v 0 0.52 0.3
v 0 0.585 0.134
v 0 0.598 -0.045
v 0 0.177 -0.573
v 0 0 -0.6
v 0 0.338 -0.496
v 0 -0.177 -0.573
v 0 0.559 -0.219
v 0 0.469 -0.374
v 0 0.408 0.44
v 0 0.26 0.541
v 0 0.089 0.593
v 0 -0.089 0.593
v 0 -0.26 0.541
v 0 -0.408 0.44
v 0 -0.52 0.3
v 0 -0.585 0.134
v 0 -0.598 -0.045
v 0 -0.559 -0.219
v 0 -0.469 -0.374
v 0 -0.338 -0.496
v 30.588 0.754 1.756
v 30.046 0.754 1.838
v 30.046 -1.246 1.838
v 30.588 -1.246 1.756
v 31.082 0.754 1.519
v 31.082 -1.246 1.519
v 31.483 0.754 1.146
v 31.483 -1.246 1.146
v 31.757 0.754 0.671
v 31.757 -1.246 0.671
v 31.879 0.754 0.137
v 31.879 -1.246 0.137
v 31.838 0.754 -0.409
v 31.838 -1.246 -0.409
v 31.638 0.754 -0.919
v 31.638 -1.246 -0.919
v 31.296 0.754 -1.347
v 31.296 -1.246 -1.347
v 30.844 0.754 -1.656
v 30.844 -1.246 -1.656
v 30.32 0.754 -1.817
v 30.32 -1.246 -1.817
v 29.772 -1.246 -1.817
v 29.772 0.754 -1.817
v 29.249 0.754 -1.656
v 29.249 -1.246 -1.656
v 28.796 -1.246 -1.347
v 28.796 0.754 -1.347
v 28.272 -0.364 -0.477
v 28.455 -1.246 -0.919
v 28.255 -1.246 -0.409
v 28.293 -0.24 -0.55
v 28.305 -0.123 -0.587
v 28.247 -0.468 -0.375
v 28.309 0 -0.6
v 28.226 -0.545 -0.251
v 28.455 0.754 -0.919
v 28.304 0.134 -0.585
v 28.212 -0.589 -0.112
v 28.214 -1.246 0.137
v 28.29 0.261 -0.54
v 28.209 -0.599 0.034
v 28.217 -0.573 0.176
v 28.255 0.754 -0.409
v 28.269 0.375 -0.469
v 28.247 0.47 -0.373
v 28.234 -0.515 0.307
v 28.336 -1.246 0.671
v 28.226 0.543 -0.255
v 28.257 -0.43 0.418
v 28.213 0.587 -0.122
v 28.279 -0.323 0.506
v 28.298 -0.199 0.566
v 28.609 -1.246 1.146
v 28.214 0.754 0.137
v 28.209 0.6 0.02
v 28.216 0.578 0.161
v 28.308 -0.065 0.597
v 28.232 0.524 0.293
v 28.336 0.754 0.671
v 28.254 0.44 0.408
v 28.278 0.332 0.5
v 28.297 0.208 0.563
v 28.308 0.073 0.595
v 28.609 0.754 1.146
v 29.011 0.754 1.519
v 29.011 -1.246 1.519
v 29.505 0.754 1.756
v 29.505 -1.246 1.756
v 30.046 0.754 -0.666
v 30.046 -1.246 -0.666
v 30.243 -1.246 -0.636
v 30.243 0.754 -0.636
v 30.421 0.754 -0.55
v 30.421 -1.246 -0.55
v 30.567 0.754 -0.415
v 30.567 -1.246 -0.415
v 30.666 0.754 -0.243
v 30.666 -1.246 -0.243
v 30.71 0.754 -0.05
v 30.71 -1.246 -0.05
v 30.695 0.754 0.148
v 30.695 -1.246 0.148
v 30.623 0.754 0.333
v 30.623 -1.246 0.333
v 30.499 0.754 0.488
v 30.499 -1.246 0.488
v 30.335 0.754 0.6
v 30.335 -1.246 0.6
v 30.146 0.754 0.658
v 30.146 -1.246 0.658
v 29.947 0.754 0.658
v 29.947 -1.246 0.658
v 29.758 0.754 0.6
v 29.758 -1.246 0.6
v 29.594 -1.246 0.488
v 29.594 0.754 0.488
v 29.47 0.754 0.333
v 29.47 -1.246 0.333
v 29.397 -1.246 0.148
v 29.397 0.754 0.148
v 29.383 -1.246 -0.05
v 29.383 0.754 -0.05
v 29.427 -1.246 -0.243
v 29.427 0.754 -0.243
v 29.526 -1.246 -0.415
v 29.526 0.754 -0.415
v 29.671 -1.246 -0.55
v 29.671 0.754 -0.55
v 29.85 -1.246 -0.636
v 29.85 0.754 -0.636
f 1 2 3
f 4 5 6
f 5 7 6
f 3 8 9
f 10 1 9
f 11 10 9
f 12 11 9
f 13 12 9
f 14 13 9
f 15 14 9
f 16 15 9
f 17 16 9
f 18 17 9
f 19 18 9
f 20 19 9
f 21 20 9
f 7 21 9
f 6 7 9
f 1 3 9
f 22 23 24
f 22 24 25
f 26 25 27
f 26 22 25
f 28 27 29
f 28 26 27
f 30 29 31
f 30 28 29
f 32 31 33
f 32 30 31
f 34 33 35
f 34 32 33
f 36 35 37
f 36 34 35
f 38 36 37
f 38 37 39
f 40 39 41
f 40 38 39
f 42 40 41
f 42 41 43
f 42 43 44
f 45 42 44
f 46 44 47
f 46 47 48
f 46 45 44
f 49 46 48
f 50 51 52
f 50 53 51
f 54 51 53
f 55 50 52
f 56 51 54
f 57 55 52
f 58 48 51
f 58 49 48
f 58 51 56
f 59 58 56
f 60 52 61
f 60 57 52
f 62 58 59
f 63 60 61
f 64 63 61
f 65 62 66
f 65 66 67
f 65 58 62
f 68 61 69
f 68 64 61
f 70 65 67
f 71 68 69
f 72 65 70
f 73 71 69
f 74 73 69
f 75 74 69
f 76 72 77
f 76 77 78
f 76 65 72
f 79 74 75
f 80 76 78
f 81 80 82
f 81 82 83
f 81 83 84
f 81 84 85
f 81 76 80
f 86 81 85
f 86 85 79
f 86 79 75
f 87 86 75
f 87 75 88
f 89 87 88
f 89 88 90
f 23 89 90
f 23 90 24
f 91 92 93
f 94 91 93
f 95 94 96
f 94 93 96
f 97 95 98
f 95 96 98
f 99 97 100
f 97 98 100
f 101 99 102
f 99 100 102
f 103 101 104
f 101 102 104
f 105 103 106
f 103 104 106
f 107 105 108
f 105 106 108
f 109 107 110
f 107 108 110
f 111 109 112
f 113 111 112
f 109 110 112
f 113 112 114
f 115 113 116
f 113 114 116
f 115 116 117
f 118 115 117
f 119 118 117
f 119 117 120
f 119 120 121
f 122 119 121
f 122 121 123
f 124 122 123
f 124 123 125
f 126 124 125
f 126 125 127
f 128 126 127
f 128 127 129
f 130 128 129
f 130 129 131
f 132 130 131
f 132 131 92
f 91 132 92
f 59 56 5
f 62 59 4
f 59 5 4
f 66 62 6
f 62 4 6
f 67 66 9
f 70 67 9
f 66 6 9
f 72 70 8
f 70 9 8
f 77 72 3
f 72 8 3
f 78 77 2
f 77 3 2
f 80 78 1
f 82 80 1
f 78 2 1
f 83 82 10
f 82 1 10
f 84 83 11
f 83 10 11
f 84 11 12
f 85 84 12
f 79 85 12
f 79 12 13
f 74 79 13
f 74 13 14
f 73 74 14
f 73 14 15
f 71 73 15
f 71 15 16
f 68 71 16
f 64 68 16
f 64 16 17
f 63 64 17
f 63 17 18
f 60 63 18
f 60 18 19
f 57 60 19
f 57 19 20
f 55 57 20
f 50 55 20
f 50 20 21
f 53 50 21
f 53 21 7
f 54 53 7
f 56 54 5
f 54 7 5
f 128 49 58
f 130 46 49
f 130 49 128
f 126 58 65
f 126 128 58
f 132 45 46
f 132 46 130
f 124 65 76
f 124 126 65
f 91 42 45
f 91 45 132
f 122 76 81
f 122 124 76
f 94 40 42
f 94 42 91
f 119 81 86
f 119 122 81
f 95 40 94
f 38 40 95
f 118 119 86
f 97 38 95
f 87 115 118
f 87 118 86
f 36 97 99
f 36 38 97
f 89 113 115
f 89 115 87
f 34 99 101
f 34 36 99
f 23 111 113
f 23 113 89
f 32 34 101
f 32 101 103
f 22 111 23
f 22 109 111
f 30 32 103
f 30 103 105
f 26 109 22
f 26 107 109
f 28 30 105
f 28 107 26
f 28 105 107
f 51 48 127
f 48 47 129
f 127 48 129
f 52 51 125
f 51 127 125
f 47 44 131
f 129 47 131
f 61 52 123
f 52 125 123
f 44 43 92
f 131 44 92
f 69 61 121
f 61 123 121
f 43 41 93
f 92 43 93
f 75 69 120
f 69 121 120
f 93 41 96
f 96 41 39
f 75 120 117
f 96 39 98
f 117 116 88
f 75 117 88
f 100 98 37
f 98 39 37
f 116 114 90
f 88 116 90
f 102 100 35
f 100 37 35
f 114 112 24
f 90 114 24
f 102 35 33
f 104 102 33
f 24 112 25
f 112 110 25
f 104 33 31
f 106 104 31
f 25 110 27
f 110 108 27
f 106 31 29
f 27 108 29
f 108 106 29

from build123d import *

# Parameters (mm, degrees)
SKETCH_1_R          = 0.6
EXTRUDE_1_DEPTH     = 30
SKETCH_2_R          = 1.837847415
EXTRUDE_2_DEPTH     = 1
SKETCH_3_R          = 0.665703361
CUT_EXTRUDE_1_DEPTH = 32.999712653


with BuildPart() as part:
    # 草图1 → 凸台-拉伸1 (new body)
    with BuildSketch(Plane(origin=(0, 0, 0), x_dir=(0, 0, -1), z_dir=(1, 0, 0))):
        Circle(SKETCH_1_R)
    extrude(amount=EXTRUDE_1_DEPTH)

    # 草图2 → 凸台-拉伸2 (add, symmetric)
    with BuildSketch(Plane(origin=(8.379426917, -0.245734266, -12), x_dir=(1, 0, 0), z_dir=(0, 1, 0))):
        with Locations(Location((21.666952485, -12, 0), (0, 0, 270))):
            Circle(SKETCH_2_R)
    extrude(amount=EXTRUDE_2_DEPTH, both=True)

    # 草图3 → 切除-拉伸1 (cut, through all)
    with BuildSketch(Plane(origin=(0, -1.245734266, 0), x_dir=(-1, 0, 0), z_dir=(0, -1, 0))):
        with Locations(Location((-30.046379401, 0, 0), (0, 0, 90))):
            Circle(SKETCH_3_R)
    extrude(amount=-CUT_EXTRUDE_1_DEPTH, mode=Mode.SUBTRACT)


solid = part.part
